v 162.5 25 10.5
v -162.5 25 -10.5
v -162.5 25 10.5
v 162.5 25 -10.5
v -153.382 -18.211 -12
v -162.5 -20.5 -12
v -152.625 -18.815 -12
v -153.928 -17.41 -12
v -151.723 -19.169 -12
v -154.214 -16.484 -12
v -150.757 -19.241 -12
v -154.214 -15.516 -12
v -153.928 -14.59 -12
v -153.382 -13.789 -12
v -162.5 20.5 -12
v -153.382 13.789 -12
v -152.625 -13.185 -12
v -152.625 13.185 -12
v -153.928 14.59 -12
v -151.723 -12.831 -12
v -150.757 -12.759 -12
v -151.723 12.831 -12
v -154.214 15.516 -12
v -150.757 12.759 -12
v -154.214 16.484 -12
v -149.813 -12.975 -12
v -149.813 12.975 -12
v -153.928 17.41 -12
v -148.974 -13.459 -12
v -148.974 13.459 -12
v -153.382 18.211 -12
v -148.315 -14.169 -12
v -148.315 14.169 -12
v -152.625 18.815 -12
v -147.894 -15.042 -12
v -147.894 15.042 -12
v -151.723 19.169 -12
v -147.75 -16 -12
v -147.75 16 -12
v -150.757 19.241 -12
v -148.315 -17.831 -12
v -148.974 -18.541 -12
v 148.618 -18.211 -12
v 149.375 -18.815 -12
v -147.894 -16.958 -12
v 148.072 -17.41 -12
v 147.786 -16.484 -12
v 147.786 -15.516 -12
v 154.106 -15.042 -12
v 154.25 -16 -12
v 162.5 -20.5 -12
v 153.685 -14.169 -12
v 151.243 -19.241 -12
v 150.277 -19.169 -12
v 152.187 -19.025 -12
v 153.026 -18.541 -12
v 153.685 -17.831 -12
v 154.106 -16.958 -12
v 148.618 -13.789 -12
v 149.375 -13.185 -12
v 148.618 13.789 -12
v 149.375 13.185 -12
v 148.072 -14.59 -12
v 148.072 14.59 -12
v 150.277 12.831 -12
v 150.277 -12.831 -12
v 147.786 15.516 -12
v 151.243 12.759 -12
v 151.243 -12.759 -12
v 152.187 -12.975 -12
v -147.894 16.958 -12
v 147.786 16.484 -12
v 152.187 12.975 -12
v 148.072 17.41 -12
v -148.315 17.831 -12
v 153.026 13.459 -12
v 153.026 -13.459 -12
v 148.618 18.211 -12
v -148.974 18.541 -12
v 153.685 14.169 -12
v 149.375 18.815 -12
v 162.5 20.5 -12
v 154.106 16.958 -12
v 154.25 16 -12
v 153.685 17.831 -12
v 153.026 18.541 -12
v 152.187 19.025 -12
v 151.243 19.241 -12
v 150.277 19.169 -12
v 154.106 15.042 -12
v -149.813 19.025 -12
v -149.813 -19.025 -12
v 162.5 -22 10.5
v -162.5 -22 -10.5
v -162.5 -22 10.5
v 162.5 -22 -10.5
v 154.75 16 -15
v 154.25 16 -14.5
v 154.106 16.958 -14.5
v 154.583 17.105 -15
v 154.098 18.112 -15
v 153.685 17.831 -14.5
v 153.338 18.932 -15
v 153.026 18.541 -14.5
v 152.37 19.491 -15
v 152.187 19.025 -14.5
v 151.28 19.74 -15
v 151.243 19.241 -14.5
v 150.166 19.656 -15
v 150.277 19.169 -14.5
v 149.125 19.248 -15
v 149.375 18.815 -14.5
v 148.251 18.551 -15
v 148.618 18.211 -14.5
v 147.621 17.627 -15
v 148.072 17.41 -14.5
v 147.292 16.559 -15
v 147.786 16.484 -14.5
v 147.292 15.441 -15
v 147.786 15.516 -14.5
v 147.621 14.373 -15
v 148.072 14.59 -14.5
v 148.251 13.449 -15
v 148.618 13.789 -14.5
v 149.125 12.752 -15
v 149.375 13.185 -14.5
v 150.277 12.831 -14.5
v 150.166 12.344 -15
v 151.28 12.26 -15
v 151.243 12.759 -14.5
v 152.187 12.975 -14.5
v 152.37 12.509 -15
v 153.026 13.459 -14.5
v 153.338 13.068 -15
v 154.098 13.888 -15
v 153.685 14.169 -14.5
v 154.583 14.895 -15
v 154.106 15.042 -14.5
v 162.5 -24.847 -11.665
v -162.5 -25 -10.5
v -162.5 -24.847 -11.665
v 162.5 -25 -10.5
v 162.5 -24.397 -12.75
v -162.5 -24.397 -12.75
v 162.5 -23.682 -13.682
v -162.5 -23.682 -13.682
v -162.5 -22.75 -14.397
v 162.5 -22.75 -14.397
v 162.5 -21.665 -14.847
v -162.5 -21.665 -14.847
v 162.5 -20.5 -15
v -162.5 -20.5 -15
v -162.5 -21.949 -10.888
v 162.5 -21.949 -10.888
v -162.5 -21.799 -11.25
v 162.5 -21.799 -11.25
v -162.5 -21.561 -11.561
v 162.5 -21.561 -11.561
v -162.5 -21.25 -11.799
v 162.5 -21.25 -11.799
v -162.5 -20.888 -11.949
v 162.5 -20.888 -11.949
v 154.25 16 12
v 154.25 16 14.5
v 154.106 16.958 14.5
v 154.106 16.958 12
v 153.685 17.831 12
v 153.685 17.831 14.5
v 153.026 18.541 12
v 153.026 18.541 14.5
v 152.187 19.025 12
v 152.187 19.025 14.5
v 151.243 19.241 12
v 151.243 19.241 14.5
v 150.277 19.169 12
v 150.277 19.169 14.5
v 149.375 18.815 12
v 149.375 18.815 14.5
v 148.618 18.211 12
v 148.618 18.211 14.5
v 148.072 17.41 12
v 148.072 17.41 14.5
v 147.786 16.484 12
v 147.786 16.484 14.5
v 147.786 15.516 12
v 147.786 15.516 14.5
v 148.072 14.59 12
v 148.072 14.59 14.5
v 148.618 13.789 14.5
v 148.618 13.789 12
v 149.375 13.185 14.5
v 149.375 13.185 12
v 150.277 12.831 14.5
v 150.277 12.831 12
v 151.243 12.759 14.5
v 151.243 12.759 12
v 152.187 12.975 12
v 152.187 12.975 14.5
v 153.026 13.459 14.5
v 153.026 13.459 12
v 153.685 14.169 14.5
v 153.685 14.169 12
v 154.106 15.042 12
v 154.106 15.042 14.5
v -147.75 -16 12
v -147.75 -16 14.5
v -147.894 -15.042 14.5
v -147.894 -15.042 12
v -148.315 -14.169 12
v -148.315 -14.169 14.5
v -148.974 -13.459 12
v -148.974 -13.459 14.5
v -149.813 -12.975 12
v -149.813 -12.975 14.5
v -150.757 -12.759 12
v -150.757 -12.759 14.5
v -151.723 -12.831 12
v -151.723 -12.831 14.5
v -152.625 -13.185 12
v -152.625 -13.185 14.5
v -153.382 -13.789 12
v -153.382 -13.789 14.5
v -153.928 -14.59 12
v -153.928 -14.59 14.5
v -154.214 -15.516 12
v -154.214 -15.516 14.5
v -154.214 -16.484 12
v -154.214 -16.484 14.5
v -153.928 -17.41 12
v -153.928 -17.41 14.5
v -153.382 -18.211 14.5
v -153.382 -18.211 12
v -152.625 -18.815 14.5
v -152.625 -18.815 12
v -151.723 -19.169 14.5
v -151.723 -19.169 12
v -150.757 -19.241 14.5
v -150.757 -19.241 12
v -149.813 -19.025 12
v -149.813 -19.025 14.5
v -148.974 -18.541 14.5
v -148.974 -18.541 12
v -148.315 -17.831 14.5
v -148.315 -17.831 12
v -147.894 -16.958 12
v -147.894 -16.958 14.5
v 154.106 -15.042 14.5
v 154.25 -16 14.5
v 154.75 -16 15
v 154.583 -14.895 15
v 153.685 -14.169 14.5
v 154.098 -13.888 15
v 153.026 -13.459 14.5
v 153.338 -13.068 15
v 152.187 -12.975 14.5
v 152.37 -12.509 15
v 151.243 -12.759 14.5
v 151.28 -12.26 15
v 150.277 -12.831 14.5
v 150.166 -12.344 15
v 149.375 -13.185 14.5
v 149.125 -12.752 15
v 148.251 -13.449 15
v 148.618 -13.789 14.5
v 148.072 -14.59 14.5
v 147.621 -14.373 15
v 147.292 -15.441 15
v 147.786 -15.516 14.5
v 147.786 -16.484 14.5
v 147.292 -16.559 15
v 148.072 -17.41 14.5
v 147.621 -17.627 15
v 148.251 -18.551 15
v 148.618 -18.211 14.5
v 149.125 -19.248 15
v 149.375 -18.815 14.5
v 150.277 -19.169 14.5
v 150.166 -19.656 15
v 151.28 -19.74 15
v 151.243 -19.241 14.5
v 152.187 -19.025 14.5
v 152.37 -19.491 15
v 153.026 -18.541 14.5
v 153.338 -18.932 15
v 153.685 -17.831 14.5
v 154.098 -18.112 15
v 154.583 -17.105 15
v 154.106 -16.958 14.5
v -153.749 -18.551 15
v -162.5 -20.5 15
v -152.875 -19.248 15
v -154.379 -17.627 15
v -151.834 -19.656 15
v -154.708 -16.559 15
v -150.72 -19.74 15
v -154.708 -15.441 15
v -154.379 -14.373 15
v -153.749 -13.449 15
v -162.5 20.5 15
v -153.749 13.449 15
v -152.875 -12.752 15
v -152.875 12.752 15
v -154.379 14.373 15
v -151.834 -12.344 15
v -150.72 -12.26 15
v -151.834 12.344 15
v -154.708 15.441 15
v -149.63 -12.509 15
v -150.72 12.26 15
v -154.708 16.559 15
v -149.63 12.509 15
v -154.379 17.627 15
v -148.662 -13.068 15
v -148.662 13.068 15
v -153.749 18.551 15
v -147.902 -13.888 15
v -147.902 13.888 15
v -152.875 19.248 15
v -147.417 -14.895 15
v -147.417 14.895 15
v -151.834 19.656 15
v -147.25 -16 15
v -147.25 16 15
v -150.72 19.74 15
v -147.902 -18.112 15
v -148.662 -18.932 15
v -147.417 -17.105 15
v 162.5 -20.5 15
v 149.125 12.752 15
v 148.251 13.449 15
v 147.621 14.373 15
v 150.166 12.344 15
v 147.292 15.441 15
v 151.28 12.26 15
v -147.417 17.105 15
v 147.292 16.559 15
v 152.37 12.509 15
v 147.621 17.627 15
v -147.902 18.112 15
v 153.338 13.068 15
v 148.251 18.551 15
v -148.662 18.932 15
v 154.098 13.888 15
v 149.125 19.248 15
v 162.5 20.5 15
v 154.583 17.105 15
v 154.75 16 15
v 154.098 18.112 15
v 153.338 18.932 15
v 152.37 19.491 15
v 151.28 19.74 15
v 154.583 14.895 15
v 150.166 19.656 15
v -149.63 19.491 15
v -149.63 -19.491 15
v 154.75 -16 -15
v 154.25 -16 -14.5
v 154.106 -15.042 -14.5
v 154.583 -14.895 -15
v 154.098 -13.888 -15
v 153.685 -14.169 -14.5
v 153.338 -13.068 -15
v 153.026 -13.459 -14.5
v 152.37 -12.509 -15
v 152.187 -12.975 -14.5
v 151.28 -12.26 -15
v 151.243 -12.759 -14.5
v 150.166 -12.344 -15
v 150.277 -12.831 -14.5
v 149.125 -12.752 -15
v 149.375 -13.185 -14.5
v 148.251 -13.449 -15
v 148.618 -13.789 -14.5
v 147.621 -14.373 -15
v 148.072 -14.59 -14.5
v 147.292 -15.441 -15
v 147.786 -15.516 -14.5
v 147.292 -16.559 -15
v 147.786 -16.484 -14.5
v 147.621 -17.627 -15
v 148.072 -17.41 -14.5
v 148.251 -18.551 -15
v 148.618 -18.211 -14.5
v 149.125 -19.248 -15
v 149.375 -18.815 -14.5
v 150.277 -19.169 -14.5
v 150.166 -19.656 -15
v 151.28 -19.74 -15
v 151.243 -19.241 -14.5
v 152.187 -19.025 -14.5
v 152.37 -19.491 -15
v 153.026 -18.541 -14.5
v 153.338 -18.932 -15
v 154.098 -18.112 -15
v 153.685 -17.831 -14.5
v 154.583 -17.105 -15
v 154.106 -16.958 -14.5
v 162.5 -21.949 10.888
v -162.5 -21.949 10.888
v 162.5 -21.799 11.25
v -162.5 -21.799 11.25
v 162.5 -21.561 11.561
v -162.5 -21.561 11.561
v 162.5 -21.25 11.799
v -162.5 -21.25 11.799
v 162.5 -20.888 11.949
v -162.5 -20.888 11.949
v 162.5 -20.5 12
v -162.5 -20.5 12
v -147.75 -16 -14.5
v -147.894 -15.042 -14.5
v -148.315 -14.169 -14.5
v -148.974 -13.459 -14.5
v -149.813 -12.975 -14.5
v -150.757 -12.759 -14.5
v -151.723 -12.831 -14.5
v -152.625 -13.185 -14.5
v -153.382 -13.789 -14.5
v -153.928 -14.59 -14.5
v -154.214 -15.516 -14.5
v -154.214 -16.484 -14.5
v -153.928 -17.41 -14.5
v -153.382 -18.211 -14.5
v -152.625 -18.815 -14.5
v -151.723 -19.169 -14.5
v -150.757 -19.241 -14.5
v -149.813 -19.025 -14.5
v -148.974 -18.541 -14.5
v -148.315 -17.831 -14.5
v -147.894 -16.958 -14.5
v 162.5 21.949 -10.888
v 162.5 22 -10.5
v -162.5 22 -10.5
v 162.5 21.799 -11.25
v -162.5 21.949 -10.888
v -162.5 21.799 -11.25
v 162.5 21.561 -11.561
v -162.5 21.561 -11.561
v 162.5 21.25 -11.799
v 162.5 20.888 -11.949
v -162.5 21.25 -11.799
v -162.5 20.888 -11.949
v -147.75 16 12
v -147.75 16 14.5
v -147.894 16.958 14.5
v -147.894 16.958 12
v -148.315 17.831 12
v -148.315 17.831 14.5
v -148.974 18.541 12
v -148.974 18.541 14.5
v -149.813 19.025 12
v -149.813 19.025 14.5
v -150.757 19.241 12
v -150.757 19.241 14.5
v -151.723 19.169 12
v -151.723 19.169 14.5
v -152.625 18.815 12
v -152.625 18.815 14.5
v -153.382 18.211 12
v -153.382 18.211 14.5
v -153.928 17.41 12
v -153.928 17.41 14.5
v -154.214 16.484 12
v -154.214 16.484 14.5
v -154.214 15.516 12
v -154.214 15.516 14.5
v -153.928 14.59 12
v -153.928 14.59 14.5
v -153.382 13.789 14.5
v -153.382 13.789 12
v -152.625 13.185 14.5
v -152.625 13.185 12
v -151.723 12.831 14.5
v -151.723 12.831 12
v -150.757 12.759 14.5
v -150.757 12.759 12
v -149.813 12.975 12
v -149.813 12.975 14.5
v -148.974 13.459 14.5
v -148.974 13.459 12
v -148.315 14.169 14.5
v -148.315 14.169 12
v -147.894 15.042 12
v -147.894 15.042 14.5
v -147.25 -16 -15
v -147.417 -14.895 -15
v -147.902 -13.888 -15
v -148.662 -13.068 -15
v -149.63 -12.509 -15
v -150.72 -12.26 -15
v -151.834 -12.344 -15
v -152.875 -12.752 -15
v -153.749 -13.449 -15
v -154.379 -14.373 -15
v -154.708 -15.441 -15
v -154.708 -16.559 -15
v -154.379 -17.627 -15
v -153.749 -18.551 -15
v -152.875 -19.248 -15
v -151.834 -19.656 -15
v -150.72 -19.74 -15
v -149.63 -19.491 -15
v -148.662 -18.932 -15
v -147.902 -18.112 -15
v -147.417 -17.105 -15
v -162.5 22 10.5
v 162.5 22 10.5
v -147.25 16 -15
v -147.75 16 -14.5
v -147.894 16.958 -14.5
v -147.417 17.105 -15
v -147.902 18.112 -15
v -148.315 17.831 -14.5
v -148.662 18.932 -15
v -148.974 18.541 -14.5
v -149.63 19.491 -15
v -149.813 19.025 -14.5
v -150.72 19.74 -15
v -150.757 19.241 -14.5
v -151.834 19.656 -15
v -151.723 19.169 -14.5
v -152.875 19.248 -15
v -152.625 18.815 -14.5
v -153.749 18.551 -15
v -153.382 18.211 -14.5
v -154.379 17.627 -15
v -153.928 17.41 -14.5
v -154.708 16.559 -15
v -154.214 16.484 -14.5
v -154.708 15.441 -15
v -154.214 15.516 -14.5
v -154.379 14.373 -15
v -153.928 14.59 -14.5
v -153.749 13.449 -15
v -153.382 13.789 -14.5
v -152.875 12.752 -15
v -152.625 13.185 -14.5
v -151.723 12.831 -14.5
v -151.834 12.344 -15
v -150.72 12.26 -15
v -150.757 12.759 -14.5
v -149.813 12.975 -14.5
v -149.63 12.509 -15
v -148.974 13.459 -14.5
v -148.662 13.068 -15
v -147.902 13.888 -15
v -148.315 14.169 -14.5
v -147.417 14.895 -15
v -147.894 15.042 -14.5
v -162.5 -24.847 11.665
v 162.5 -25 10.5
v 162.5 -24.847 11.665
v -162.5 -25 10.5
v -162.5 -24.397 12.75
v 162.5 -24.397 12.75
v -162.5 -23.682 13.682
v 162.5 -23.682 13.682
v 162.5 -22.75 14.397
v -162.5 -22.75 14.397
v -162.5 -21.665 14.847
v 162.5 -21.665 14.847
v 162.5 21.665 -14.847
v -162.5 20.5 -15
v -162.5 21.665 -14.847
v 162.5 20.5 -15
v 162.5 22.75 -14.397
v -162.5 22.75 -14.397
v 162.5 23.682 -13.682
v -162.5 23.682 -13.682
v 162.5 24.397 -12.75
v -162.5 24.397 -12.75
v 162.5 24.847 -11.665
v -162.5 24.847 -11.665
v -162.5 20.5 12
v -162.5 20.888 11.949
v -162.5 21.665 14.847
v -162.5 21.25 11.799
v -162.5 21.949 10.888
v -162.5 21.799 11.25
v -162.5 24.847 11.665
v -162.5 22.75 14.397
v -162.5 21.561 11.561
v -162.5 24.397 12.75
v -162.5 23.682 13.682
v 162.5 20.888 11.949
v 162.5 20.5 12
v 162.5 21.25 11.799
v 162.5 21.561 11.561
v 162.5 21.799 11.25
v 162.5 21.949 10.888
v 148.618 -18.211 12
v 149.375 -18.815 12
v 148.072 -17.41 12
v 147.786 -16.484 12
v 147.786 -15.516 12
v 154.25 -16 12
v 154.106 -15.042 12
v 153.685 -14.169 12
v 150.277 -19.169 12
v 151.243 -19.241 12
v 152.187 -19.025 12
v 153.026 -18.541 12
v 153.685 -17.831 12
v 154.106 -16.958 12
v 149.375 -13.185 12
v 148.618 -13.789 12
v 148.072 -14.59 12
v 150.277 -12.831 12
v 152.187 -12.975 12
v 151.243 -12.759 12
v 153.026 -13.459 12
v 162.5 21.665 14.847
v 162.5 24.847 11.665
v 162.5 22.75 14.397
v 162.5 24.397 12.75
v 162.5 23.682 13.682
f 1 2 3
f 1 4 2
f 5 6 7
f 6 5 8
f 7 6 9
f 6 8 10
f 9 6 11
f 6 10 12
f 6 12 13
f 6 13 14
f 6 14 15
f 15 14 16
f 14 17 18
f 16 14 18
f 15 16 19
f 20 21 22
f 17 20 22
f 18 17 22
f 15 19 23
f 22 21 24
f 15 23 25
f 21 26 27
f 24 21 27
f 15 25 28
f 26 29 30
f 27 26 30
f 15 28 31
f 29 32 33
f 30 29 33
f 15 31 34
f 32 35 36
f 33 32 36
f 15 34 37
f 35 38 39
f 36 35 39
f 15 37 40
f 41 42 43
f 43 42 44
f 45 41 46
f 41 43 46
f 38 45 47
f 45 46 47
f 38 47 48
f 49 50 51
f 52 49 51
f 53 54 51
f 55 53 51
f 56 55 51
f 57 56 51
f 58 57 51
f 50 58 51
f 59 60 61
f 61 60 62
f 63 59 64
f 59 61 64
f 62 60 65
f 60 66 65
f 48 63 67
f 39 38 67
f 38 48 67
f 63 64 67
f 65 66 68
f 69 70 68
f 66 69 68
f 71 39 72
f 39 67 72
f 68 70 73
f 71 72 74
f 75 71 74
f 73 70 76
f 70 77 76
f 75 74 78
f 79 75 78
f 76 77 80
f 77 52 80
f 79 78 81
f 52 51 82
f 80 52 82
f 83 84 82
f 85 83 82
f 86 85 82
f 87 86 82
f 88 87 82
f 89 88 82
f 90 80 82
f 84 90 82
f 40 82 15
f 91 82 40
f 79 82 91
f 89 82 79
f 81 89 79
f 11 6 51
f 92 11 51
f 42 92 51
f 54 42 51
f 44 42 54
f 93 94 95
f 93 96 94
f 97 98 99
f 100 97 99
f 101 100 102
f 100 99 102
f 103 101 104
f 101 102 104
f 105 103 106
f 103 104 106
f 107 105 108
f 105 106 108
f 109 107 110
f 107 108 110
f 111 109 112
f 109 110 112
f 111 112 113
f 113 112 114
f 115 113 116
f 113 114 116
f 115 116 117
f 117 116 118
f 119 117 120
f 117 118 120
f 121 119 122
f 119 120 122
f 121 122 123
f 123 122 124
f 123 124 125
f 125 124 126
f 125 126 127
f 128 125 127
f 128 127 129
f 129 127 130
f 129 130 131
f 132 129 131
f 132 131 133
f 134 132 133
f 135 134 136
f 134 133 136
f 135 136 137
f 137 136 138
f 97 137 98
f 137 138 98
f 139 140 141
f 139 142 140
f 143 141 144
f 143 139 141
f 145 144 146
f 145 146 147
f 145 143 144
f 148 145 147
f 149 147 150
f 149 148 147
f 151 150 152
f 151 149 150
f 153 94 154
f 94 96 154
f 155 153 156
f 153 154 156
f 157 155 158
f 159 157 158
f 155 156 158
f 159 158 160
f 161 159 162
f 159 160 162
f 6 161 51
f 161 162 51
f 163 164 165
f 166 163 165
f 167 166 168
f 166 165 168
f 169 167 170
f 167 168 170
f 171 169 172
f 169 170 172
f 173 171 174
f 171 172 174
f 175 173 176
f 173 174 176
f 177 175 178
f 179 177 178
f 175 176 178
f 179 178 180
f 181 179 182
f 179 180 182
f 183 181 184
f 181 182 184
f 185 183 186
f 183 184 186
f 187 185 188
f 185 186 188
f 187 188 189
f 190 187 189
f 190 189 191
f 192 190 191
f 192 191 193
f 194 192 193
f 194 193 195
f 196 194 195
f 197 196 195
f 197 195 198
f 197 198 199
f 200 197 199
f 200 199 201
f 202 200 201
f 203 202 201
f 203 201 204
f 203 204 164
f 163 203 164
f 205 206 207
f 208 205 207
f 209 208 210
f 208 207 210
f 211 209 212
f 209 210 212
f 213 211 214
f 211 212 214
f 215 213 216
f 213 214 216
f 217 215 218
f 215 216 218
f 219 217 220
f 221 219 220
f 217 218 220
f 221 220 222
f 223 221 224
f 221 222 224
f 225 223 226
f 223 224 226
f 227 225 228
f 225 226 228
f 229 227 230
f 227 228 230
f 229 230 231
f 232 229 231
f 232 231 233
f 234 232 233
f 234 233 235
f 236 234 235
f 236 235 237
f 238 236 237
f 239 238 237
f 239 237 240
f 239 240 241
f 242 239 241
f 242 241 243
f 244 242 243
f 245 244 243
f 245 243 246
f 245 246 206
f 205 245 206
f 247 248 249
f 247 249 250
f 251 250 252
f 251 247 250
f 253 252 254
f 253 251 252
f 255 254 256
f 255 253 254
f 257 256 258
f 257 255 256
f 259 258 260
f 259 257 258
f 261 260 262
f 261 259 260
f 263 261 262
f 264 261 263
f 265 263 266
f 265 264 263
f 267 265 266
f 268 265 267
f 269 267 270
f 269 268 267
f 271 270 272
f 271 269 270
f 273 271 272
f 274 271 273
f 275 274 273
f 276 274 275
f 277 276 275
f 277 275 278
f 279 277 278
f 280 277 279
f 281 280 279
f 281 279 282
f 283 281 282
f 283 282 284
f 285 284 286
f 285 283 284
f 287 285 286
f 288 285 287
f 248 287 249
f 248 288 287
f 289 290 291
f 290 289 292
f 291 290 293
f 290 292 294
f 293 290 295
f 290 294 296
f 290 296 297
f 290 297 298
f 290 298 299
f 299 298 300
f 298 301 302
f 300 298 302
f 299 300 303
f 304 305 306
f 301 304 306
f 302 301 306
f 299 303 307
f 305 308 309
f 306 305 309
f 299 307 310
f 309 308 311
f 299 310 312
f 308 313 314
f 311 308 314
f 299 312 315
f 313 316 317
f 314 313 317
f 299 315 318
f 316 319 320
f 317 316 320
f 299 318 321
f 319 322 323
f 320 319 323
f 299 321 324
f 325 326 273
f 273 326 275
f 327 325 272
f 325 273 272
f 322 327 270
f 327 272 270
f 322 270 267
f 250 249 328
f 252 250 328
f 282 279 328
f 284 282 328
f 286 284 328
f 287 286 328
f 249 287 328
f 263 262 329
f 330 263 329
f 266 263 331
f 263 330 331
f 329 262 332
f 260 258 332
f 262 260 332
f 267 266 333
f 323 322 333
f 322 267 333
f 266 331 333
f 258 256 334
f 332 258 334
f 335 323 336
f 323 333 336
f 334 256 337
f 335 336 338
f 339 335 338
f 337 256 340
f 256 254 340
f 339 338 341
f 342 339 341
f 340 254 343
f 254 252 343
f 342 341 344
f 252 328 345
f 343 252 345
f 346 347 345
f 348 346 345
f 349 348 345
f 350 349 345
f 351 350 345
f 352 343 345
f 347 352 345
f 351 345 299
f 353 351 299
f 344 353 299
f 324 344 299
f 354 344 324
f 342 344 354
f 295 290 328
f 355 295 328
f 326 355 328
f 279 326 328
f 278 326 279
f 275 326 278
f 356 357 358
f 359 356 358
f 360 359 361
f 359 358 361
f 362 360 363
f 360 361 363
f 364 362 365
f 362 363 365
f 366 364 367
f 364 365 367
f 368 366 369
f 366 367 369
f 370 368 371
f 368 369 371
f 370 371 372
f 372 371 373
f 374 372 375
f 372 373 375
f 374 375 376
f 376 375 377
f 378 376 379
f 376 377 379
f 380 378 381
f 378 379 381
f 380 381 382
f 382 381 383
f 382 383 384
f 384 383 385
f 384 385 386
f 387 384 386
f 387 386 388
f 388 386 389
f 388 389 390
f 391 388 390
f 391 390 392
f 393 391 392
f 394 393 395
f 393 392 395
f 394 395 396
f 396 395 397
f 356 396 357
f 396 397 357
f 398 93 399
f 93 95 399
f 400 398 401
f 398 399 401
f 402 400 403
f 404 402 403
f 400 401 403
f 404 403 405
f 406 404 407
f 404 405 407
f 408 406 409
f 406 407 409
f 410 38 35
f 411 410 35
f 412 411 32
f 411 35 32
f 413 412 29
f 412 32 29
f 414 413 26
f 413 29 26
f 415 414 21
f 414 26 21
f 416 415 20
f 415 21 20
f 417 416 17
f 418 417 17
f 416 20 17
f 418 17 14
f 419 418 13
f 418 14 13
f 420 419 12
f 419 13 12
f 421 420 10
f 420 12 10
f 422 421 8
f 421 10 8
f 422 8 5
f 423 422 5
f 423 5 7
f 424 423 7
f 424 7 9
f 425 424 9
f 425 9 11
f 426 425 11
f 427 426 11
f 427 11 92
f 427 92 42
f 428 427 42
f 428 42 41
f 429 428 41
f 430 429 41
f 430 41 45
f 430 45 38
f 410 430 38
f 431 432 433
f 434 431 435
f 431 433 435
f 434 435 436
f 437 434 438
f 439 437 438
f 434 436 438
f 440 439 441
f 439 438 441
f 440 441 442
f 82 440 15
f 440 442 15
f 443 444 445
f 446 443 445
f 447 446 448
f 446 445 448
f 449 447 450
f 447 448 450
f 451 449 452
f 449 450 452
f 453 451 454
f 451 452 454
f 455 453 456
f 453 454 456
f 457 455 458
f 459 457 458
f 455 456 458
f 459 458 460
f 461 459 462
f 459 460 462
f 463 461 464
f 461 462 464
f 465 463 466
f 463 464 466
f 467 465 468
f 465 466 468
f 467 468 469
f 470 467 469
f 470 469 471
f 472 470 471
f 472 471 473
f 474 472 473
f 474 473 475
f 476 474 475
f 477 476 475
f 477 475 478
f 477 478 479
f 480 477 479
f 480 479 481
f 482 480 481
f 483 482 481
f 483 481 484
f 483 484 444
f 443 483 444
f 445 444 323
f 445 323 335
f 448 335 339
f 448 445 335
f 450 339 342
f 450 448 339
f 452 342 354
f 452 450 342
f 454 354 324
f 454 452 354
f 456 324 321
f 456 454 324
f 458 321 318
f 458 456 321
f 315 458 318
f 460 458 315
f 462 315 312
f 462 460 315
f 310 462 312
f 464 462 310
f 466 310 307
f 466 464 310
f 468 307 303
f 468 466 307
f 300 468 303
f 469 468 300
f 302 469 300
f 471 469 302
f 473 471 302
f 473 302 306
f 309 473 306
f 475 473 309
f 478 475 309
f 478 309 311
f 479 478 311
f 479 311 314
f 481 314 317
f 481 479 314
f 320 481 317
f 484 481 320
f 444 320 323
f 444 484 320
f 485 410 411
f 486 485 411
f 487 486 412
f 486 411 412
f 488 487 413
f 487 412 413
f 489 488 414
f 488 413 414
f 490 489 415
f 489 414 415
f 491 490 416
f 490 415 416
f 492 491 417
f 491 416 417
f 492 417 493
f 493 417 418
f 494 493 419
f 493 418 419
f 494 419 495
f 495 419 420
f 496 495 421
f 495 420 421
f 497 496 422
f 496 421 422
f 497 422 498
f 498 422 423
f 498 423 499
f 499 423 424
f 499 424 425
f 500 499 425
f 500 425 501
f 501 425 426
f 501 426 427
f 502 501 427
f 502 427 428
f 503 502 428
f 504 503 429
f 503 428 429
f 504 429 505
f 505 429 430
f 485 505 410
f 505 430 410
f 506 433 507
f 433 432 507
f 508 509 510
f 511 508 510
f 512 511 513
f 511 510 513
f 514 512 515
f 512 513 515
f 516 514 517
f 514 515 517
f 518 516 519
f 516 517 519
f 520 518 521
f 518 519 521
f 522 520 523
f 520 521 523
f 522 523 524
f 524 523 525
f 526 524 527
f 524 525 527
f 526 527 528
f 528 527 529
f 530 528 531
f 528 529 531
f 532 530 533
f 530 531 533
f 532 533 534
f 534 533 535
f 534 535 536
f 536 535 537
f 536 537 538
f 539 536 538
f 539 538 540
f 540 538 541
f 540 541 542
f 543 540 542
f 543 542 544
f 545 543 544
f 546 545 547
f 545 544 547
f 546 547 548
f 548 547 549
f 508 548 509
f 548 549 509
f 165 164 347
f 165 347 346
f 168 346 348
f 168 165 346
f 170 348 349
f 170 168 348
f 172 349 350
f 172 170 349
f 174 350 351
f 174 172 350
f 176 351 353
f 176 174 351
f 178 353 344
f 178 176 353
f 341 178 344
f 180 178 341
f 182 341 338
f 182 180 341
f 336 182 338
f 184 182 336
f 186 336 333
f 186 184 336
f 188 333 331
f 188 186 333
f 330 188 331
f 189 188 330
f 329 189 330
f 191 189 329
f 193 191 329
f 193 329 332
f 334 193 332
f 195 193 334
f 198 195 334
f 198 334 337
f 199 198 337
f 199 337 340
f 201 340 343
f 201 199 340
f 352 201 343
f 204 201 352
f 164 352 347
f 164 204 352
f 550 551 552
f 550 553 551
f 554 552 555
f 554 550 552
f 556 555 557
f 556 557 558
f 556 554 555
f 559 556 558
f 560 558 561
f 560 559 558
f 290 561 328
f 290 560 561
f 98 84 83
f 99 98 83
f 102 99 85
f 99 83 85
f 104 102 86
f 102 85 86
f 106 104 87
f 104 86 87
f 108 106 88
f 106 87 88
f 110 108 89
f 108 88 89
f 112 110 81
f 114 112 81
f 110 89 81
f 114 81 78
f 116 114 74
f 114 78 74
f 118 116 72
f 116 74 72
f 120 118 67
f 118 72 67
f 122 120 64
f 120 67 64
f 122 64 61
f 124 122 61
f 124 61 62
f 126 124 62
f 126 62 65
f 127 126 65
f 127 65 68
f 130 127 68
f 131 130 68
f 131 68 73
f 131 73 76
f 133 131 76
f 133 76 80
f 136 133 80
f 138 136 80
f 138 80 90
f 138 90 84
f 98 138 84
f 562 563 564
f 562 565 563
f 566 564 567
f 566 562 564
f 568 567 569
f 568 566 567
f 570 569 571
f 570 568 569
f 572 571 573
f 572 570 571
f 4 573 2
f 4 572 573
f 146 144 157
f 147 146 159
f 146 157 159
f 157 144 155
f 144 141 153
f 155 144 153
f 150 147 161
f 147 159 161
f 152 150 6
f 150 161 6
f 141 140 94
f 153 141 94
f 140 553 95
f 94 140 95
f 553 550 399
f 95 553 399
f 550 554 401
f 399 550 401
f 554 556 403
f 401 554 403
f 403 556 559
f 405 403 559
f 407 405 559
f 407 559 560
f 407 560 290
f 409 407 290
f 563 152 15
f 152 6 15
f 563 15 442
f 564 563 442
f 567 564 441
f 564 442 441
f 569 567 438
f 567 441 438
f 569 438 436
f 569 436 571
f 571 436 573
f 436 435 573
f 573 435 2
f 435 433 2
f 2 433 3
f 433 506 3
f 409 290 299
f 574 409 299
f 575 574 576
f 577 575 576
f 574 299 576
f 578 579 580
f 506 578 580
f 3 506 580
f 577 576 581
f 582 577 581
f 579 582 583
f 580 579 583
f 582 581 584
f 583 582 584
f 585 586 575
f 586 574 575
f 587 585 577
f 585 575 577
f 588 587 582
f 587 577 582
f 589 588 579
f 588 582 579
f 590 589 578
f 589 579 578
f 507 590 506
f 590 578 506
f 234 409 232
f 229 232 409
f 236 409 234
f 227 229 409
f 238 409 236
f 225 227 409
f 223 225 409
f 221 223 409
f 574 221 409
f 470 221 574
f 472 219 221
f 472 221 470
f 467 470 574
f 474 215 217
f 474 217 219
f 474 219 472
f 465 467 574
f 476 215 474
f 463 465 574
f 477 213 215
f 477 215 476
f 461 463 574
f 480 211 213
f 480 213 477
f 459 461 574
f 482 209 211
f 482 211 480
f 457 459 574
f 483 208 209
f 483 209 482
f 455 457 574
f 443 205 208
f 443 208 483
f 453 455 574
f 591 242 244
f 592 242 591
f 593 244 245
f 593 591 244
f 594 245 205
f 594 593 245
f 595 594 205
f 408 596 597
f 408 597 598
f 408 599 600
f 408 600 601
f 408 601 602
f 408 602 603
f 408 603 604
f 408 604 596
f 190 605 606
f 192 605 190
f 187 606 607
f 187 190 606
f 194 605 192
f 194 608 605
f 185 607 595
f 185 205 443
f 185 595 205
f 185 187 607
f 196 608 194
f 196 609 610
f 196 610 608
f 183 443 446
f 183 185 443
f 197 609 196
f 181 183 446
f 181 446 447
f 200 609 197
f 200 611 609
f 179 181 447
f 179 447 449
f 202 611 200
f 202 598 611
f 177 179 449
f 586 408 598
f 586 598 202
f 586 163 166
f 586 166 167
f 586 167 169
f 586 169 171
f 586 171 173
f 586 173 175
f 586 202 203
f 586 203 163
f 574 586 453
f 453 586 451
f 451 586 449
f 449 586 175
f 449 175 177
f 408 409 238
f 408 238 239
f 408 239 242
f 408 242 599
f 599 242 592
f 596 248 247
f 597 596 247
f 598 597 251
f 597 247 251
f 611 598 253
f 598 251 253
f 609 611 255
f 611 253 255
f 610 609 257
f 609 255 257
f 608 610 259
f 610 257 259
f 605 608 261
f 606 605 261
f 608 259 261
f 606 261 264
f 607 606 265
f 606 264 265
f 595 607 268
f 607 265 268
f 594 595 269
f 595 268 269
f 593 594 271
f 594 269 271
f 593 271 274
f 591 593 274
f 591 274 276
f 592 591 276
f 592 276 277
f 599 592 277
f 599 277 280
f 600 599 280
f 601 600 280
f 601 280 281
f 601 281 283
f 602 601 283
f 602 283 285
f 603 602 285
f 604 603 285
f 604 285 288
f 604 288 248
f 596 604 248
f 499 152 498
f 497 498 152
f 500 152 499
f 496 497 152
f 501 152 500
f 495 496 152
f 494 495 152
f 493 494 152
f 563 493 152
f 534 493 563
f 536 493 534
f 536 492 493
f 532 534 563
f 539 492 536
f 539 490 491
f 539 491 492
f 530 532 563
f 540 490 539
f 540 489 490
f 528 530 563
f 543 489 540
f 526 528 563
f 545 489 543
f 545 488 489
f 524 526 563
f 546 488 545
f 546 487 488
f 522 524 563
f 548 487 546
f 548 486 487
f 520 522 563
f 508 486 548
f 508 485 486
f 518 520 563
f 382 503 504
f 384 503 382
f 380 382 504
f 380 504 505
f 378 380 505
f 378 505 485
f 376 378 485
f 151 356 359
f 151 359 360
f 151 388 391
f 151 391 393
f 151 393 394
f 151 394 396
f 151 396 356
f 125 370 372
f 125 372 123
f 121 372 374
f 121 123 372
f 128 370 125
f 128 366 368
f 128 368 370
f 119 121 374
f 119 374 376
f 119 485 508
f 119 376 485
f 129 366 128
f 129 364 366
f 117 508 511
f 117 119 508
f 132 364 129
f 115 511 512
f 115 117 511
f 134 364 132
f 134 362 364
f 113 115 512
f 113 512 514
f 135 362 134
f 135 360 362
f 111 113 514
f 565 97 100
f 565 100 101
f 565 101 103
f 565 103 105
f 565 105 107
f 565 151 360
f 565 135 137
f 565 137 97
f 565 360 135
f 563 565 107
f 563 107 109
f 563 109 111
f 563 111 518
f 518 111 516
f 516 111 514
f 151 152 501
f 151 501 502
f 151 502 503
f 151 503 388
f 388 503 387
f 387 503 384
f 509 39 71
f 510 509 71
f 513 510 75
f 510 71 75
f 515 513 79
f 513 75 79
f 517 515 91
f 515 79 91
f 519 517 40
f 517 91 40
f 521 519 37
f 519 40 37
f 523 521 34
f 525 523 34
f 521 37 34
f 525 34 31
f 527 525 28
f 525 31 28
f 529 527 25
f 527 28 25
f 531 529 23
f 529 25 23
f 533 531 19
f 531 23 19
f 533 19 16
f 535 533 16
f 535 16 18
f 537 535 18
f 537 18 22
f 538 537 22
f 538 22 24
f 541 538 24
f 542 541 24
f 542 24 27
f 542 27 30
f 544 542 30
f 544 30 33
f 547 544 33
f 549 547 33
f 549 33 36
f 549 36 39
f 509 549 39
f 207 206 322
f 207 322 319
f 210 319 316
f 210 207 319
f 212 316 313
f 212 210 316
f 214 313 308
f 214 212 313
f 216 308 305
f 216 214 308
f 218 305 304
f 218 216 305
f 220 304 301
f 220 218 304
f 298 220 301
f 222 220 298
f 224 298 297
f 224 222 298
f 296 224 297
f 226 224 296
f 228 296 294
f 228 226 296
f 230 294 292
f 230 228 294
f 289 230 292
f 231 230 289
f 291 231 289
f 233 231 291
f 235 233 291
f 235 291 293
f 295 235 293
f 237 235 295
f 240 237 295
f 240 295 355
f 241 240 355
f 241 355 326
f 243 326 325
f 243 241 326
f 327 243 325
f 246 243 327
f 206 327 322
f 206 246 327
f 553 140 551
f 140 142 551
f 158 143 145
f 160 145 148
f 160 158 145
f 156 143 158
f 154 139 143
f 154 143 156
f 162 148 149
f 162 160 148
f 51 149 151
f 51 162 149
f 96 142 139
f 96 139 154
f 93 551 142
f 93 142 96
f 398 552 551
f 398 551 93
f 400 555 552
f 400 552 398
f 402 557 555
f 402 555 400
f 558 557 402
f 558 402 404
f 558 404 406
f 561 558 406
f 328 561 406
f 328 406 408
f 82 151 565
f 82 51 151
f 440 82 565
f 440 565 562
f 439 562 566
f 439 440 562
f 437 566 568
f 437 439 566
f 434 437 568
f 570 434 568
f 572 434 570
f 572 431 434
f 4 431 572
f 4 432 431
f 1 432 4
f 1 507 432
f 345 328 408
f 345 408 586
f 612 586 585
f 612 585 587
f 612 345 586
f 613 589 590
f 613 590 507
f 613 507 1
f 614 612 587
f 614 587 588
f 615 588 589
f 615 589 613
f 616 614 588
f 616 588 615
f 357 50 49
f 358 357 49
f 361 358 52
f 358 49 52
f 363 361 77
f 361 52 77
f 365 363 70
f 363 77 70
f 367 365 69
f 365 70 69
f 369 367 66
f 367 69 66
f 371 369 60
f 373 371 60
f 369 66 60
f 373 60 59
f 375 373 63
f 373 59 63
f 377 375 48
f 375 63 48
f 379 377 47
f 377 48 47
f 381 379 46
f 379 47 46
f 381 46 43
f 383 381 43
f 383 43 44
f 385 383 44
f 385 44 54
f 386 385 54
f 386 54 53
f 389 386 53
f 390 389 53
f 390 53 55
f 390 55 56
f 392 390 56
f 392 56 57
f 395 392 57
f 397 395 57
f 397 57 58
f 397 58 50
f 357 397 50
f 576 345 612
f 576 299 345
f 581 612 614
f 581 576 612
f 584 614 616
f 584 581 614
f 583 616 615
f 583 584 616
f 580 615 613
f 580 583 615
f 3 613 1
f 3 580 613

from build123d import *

# Parameters (mm, degrees)
F0_W     = 50
F0_H     = 30
F0_W_2   = 44
F0_H_2   = 24
F1_DEPTH = 162.5
F2_R     = 1.5
F3_R     = 4.5
F4_R     = 3.25
F5_DEPTH = 35
F6_SIZE  = 0.5


with BuildPart() as f1:
    # F0 (on Right) → F1 (new body, symmetric)
    with BuildSketch(Plane.YZ):
        Rectangle(F0_W, F0_H)
        Rectangle(F0_W_2, F0_H_2, mode=Mode.SUBTRACT)
    extrude(amount=F1_DEPTH, both=True)

    # F2
    f2_edges = [f1.edges().sort_by_distance(p)[0] for p in [
        (0, -22, -12),
        (0, -22, 12),
        (0, 22, -12),
        (0, 22, 12),
    ]]
    fillet(f2_edges, radius=F2_R)

    # F3
    f3_edges = [f1.edges().sort_by_distance(p)[0] for p in [
        (0, -25, 15),
        (0, -25, -15),
        (0, 25, -15),
        (0, 25, 15),
    ]]
    fillet(f3_edges, radius=F3_R)

    # F4 (on face) → F5 (cut)
    with BuildSketch(Plane.XY.offset(15)):
        with Locations((-151, 16)):
            Circle(F4_R)
        with Locations((-151, -16)):
            Circle(F4_R)
        with Locations((151, -16)):
            Circle(F4_R)
        with Locations((151, 16)):
            Circle(F4_R)
    extrude(amount=-F5_DEPTH, mode=Mode.SUBTRACT)

    # F6
    f6_edges = [f1.edges().sort_by_distance(p)[0] for p in [
        (-154.25, -16, 15),
        (-154.25, 16, 15),
        (147.75, -16, 15),
        (147.75, 16, 15),
        (147.75, 16, -15),
        (147.75, -16, -15),
        (-154.25, 16, -15),
        (-154.25, -16, -15),
    ]]
    chamfer(f6_edges, length=F6_SIZE)


solid = f1.part
